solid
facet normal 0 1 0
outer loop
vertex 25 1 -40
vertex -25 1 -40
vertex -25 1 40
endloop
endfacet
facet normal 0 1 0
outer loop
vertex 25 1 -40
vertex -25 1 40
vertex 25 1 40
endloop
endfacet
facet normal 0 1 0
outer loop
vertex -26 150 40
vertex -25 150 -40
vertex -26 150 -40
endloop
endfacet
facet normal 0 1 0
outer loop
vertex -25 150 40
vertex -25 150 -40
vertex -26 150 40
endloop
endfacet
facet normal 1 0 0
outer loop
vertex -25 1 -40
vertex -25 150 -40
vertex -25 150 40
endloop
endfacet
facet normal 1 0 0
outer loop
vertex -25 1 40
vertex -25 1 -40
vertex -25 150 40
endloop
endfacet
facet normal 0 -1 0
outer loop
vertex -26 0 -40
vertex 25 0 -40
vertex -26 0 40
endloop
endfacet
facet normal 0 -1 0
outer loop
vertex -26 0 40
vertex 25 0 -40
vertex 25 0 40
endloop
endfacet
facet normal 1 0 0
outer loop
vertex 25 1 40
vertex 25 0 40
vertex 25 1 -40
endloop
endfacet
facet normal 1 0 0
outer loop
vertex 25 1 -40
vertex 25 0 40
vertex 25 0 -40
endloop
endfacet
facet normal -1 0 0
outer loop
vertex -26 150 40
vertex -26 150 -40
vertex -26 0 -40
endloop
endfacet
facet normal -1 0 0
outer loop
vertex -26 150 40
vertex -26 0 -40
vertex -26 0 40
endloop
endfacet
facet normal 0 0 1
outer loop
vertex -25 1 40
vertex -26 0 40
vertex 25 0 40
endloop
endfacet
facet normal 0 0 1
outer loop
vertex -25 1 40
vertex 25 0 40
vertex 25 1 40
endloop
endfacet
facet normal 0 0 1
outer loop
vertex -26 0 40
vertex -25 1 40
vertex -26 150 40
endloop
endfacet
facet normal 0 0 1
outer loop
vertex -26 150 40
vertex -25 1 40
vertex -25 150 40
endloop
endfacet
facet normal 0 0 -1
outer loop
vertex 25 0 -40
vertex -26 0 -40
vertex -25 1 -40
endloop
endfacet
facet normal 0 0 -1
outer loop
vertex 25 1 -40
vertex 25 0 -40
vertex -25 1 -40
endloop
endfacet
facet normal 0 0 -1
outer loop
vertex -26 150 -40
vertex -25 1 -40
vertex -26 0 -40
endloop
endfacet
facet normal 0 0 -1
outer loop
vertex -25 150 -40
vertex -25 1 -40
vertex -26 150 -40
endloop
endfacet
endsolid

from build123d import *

# Parameters (mm, degrees)
SKETCH1_W           = 50
SKETCH1_H           = 80
BOSS_EXTRUDE1_DEPTH = 1
SKETCH3_W           = 80
SKETCH3_H           = 150
BOSS_EXTRUDE2_DEPTH = 1


with BuildPart() as part:
    # Sketch1 → Boss-Extrude1 (new body)
    with BuildSketch(Plane(origin=(0, 0, 0), x_dir=(1, 0, 0), z_dir=(0, 1, 0))):
        Rectangle(SKETCH1_W, SKETCH1_H)
    extrude(amount=BOSS_EXTRUDE1_DEPTH)

    # Sketch3 → Boss-Extrude2 (add)
    with BuildSketch(Plane.ZY.offset(25)):
        with Locations((0, 75)):
            Rectangle(SKETCH3_W, SKETCH3_H)
    extrude(amount=BOSS_EXTRUDE2_DEPTH)


solid = part.part
